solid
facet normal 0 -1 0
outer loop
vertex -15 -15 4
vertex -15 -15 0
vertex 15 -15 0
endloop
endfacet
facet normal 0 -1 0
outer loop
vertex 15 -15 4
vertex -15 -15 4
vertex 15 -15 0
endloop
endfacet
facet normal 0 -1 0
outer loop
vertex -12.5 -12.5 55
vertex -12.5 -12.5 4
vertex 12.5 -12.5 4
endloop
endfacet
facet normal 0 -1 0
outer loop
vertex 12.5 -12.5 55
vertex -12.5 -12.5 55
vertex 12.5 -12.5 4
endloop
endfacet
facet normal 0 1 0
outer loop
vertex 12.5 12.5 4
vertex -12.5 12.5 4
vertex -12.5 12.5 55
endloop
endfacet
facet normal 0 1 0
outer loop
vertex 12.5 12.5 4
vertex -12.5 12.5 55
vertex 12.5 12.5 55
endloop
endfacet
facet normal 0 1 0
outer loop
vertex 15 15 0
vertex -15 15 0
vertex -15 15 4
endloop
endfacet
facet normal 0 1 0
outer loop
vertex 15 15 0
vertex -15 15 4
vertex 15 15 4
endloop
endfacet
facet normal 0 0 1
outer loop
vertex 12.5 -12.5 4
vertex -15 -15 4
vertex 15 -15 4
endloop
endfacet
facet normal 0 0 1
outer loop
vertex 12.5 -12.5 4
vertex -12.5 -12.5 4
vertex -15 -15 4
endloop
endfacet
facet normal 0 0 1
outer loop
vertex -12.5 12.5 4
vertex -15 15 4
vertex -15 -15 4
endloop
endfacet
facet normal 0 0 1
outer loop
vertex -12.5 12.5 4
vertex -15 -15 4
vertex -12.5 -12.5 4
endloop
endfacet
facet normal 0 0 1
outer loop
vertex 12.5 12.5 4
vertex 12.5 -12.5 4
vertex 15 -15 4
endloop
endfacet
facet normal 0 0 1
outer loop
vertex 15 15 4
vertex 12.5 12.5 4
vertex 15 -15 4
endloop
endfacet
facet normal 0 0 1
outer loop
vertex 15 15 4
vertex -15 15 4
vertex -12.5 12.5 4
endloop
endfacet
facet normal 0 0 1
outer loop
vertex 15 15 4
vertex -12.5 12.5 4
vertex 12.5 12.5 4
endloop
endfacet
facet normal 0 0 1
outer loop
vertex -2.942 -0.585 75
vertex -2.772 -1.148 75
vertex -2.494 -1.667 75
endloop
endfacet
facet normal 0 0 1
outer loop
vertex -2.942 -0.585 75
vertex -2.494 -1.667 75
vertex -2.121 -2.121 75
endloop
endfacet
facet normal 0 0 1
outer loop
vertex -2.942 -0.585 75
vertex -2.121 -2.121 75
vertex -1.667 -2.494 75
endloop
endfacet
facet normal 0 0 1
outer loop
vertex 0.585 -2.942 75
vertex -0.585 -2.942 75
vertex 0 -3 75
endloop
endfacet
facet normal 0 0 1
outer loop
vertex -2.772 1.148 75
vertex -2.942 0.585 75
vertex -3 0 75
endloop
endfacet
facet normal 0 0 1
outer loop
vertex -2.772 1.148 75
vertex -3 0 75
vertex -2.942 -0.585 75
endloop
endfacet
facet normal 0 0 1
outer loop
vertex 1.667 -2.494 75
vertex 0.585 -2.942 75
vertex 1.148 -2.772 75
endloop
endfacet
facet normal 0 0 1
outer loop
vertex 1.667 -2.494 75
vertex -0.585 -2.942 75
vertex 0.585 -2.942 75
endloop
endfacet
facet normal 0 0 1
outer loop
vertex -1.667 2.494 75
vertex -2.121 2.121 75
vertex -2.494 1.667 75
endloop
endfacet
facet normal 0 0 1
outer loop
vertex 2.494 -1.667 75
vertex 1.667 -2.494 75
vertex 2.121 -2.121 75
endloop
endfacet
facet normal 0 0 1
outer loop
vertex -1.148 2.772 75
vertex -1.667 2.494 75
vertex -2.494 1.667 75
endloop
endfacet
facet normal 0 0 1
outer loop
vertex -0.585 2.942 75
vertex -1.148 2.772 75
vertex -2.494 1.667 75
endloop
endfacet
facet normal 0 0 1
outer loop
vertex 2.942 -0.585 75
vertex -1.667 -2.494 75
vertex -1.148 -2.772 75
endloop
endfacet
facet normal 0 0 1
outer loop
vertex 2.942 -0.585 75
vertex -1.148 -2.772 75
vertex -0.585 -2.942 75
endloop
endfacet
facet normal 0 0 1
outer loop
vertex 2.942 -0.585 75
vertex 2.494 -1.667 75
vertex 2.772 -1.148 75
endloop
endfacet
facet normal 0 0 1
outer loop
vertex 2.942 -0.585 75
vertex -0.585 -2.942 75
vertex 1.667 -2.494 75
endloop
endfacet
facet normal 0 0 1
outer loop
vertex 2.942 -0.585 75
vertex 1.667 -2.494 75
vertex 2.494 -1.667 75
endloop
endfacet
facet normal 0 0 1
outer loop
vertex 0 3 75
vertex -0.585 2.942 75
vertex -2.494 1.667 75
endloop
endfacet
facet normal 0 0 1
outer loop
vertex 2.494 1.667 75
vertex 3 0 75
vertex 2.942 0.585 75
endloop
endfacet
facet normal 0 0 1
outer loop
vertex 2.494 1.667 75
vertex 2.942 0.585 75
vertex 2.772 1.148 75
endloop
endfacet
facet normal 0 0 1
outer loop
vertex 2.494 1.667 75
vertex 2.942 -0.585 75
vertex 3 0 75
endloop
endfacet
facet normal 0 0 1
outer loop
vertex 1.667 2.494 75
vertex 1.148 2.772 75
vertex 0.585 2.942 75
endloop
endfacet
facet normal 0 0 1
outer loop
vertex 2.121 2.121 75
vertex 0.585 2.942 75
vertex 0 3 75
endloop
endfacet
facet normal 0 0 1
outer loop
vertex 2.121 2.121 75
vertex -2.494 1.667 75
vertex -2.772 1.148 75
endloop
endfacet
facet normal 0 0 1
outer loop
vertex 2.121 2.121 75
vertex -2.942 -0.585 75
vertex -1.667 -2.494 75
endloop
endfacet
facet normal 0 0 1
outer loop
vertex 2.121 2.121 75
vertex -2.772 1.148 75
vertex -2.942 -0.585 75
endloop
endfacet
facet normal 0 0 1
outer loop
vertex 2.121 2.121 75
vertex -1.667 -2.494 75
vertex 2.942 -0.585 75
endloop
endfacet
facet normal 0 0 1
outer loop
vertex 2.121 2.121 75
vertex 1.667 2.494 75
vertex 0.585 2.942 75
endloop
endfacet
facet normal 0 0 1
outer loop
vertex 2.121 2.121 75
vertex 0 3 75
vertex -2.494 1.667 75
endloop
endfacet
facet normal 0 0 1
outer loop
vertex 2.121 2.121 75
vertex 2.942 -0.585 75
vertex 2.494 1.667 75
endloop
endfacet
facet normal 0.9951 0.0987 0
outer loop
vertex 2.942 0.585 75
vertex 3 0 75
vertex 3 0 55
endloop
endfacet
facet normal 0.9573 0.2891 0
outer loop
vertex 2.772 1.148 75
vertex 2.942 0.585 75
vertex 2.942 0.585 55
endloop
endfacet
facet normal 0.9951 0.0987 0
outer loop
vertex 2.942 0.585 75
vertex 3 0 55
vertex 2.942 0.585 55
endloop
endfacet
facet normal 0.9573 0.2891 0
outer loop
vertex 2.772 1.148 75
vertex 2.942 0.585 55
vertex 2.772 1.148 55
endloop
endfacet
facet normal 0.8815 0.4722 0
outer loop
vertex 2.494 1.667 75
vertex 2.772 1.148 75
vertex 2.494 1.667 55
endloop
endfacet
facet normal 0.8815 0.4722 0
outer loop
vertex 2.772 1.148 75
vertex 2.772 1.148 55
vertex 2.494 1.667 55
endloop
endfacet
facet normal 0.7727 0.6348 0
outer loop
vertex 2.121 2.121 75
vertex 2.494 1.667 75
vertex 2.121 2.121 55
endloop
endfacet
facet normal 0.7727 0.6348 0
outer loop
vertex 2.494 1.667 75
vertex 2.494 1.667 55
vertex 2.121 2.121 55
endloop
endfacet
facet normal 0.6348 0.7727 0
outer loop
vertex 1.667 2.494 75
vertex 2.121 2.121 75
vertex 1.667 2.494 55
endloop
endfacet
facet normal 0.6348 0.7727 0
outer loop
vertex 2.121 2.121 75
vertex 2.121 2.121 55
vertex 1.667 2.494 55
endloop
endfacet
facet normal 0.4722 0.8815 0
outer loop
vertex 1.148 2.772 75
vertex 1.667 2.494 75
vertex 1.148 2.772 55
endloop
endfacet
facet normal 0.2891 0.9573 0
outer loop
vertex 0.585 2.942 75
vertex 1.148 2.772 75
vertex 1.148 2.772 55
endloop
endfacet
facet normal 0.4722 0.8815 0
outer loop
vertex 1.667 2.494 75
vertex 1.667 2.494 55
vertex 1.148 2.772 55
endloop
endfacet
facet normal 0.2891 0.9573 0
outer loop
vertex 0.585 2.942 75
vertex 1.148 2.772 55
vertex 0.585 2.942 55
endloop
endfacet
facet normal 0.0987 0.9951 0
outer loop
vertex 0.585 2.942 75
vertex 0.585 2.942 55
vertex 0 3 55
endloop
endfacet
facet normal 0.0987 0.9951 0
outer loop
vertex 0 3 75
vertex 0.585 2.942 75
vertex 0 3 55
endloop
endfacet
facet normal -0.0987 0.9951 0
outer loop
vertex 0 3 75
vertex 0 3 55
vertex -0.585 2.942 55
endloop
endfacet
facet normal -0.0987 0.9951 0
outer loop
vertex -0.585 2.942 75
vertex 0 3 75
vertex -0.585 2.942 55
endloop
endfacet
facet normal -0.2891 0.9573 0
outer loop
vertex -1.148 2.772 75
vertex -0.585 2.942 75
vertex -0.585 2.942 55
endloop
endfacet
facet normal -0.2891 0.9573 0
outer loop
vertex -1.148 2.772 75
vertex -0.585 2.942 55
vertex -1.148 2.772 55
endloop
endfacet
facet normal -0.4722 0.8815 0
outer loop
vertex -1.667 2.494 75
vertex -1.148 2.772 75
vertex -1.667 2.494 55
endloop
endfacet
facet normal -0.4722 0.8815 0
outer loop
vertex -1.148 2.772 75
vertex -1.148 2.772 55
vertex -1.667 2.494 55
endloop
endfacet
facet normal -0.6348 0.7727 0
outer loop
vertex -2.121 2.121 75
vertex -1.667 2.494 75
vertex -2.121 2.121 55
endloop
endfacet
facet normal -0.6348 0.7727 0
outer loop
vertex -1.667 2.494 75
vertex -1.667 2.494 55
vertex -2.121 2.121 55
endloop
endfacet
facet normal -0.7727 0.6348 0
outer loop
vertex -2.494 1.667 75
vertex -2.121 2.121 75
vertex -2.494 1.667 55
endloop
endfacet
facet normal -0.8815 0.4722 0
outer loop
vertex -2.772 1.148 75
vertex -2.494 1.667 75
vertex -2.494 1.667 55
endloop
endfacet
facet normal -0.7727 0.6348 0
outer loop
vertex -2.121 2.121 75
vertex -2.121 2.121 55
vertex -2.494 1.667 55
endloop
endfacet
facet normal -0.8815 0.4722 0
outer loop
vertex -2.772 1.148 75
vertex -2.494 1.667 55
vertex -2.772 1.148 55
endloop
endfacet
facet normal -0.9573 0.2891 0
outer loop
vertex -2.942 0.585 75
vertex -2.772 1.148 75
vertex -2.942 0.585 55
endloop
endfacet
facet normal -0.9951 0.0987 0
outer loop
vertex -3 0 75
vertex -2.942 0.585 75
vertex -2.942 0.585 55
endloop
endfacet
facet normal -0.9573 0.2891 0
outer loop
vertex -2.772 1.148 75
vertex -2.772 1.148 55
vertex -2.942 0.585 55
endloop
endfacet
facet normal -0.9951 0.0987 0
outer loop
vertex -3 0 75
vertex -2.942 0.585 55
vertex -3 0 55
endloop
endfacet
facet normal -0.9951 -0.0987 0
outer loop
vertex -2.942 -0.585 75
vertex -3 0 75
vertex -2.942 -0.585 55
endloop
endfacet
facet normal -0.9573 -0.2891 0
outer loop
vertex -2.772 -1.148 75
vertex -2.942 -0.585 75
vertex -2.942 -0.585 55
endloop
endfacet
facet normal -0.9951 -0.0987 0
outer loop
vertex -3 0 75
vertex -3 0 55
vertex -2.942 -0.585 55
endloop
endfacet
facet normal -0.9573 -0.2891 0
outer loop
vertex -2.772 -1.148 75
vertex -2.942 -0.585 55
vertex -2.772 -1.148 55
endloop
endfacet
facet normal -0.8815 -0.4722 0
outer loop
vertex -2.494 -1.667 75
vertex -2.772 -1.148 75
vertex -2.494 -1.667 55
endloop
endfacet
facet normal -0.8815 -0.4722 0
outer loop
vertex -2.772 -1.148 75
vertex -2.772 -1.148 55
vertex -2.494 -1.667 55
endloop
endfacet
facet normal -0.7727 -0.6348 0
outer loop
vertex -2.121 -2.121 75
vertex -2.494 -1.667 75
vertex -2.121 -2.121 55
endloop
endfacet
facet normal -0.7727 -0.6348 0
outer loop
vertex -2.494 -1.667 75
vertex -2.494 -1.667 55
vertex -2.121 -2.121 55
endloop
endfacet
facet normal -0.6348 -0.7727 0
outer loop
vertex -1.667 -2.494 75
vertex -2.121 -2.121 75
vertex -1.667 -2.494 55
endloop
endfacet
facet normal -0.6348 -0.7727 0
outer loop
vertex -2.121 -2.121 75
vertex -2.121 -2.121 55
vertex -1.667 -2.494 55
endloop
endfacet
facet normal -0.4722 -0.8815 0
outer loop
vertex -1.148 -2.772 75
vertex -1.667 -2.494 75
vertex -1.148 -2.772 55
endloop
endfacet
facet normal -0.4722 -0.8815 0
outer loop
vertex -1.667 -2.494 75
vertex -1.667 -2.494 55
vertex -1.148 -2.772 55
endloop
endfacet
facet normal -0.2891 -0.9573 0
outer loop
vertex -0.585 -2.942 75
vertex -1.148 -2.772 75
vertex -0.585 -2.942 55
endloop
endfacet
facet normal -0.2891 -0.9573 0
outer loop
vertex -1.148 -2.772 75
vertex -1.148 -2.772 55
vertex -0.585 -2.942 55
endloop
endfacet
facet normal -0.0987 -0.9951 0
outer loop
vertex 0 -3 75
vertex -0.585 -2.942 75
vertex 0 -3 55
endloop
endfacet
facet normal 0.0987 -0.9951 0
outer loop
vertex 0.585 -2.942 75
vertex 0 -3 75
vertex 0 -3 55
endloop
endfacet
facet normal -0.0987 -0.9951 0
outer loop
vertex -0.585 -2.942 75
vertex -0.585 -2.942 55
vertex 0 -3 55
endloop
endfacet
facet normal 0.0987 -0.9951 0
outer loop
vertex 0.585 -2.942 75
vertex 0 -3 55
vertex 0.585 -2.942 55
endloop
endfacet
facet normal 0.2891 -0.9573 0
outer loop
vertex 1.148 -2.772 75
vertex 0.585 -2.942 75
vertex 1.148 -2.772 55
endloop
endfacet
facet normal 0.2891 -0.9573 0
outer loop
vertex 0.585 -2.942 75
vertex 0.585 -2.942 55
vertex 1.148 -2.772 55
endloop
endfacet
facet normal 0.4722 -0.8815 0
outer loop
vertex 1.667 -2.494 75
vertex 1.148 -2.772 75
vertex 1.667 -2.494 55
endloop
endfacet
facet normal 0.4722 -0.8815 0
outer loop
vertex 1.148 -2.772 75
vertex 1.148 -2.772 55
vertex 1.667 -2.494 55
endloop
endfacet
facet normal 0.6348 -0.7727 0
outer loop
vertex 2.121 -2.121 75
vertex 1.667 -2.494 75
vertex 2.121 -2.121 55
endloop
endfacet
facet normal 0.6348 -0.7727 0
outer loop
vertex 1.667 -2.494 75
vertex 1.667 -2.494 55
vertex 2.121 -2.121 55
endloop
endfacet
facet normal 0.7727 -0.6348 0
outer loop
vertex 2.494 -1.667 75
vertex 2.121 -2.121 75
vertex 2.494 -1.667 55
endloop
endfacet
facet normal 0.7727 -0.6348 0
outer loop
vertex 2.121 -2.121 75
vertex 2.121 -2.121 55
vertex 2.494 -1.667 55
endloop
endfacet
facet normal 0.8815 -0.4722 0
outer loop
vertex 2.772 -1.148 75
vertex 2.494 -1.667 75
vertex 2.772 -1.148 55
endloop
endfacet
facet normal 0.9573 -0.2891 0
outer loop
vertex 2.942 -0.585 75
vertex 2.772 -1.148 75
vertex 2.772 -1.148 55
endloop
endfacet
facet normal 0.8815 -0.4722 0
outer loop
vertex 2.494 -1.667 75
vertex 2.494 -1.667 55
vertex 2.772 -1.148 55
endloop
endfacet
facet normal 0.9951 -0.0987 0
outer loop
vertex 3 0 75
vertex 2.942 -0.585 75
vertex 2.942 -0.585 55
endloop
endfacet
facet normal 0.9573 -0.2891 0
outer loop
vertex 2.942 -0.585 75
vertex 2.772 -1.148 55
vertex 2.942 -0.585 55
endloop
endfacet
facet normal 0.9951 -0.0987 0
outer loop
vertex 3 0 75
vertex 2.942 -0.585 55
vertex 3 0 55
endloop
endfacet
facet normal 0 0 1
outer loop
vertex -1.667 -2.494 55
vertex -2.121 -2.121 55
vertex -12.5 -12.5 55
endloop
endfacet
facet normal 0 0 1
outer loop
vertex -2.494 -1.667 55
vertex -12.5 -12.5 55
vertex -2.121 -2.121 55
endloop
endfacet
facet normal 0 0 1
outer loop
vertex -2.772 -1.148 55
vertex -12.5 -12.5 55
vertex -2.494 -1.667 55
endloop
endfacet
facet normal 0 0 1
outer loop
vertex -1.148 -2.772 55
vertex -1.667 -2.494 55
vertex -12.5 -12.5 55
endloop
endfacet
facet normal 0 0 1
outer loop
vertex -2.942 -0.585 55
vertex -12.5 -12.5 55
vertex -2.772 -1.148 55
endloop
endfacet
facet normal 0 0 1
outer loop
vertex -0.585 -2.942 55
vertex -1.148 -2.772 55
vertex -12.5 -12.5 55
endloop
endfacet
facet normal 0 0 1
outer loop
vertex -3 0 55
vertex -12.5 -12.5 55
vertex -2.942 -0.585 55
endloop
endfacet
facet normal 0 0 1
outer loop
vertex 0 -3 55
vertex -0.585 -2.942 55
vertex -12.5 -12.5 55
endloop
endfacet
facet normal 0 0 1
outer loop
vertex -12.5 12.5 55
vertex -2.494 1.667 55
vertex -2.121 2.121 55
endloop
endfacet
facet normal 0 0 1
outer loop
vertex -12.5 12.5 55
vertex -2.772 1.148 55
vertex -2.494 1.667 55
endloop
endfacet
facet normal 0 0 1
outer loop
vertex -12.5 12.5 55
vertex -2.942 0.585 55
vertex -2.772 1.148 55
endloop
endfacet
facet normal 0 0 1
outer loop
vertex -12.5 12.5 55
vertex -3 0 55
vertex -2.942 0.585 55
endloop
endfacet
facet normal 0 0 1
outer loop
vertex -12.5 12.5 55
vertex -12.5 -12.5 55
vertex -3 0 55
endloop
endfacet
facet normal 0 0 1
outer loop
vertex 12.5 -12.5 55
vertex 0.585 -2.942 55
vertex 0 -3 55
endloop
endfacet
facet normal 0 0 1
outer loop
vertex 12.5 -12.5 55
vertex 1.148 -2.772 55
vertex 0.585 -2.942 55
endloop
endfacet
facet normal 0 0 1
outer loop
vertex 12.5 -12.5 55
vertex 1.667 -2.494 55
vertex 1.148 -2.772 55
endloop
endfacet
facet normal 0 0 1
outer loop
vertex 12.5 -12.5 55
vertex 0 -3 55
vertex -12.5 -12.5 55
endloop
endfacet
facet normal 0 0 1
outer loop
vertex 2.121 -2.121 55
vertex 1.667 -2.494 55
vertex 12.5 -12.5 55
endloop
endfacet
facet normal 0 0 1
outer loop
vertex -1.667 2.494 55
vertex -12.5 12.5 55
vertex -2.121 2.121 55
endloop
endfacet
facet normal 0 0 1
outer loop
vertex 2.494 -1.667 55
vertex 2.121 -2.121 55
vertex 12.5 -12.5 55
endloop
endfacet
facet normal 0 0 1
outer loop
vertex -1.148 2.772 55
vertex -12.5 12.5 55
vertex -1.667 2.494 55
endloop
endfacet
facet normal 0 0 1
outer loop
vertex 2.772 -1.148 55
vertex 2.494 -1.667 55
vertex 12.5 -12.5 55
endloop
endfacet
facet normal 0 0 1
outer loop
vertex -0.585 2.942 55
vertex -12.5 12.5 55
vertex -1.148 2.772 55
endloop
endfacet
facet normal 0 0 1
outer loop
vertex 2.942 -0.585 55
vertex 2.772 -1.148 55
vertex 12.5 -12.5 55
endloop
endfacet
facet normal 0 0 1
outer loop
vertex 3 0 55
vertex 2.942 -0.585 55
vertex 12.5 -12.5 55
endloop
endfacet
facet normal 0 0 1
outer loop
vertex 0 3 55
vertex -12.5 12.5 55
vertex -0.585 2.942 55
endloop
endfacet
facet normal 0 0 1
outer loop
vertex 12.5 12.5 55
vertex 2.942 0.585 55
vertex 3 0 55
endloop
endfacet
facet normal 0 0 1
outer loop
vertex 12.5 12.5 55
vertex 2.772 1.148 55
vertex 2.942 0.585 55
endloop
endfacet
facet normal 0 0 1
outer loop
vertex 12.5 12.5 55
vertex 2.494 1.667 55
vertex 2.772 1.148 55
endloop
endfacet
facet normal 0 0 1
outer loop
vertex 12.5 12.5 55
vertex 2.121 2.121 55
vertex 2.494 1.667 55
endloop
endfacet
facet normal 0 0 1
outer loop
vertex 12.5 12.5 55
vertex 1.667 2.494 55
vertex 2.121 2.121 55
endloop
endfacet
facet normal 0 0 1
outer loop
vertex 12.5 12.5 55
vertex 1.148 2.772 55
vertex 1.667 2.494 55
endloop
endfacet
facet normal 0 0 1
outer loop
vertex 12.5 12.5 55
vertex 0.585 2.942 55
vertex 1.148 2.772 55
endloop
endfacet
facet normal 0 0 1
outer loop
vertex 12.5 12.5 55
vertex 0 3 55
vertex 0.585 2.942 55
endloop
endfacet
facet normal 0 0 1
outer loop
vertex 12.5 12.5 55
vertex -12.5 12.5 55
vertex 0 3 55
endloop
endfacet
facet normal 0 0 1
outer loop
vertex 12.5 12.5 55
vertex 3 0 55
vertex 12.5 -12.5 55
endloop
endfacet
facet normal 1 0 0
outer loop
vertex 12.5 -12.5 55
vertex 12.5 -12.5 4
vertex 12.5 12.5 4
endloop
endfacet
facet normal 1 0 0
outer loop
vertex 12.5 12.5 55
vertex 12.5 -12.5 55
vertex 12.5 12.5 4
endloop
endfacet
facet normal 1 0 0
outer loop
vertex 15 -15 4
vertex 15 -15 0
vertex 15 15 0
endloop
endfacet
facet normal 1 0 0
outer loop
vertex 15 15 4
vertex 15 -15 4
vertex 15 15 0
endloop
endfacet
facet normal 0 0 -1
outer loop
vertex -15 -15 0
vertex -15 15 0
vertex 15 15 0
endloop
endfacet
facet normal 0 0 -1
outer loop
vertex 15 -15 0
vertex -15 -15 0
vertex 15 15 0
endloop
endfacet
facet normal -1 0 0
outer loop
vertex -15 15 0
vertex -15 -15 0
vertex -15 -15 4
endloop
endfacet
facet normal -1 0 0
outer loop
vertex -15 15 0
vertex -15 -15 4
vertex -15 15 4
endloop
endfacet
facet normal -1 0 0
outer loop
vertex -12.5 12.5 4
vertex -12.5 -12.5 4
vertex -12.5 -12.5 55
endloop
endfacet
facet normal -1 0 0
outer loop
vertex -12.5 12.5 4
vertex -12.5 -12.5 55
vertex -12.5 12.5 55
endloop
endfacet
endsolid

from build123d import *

# Parameters (mm, degrees)
SKETCH1_W           = 30
SKETCH1_H           = 30
BOSS_EXTRUDE1_DEPTH = 4
SKETCH2_W           = 25
SKETCH2_H           = 25
BOSS_EXTRUDE2_DEPTH = 51
SKETCH3_R           = 3
BOSS_EXTRUDE3_DEPTH = 20


with BuildPart() as part:
    # Sketch1 → Boss-Extrude1 (new body)
    with BuildSketch(Plane.XY):
        Rectangle(SKETCH1_W, SKETCH1_H)
    extrude(amount=BOSS_EXTRUDE1_DEPTH)

    # Sketch2 → Boss-Extrude2 (add)
    with BuildSketch(Plane.XY.offset(4)):
        Rectangle(SKETCH2_W, SKETCH2_H)
    extrude(amount=BOSS_EXTRUDE2_DEPTH)

    # Sketch3 → Boss-Extrude3 (add)
    with BuildSketch(Plane.XY.offset(55)):
        Circle(SKETCH3_R)
    extrude(amount=BOSS_EXTRUDE3_DEPTH)


solid = part.part
